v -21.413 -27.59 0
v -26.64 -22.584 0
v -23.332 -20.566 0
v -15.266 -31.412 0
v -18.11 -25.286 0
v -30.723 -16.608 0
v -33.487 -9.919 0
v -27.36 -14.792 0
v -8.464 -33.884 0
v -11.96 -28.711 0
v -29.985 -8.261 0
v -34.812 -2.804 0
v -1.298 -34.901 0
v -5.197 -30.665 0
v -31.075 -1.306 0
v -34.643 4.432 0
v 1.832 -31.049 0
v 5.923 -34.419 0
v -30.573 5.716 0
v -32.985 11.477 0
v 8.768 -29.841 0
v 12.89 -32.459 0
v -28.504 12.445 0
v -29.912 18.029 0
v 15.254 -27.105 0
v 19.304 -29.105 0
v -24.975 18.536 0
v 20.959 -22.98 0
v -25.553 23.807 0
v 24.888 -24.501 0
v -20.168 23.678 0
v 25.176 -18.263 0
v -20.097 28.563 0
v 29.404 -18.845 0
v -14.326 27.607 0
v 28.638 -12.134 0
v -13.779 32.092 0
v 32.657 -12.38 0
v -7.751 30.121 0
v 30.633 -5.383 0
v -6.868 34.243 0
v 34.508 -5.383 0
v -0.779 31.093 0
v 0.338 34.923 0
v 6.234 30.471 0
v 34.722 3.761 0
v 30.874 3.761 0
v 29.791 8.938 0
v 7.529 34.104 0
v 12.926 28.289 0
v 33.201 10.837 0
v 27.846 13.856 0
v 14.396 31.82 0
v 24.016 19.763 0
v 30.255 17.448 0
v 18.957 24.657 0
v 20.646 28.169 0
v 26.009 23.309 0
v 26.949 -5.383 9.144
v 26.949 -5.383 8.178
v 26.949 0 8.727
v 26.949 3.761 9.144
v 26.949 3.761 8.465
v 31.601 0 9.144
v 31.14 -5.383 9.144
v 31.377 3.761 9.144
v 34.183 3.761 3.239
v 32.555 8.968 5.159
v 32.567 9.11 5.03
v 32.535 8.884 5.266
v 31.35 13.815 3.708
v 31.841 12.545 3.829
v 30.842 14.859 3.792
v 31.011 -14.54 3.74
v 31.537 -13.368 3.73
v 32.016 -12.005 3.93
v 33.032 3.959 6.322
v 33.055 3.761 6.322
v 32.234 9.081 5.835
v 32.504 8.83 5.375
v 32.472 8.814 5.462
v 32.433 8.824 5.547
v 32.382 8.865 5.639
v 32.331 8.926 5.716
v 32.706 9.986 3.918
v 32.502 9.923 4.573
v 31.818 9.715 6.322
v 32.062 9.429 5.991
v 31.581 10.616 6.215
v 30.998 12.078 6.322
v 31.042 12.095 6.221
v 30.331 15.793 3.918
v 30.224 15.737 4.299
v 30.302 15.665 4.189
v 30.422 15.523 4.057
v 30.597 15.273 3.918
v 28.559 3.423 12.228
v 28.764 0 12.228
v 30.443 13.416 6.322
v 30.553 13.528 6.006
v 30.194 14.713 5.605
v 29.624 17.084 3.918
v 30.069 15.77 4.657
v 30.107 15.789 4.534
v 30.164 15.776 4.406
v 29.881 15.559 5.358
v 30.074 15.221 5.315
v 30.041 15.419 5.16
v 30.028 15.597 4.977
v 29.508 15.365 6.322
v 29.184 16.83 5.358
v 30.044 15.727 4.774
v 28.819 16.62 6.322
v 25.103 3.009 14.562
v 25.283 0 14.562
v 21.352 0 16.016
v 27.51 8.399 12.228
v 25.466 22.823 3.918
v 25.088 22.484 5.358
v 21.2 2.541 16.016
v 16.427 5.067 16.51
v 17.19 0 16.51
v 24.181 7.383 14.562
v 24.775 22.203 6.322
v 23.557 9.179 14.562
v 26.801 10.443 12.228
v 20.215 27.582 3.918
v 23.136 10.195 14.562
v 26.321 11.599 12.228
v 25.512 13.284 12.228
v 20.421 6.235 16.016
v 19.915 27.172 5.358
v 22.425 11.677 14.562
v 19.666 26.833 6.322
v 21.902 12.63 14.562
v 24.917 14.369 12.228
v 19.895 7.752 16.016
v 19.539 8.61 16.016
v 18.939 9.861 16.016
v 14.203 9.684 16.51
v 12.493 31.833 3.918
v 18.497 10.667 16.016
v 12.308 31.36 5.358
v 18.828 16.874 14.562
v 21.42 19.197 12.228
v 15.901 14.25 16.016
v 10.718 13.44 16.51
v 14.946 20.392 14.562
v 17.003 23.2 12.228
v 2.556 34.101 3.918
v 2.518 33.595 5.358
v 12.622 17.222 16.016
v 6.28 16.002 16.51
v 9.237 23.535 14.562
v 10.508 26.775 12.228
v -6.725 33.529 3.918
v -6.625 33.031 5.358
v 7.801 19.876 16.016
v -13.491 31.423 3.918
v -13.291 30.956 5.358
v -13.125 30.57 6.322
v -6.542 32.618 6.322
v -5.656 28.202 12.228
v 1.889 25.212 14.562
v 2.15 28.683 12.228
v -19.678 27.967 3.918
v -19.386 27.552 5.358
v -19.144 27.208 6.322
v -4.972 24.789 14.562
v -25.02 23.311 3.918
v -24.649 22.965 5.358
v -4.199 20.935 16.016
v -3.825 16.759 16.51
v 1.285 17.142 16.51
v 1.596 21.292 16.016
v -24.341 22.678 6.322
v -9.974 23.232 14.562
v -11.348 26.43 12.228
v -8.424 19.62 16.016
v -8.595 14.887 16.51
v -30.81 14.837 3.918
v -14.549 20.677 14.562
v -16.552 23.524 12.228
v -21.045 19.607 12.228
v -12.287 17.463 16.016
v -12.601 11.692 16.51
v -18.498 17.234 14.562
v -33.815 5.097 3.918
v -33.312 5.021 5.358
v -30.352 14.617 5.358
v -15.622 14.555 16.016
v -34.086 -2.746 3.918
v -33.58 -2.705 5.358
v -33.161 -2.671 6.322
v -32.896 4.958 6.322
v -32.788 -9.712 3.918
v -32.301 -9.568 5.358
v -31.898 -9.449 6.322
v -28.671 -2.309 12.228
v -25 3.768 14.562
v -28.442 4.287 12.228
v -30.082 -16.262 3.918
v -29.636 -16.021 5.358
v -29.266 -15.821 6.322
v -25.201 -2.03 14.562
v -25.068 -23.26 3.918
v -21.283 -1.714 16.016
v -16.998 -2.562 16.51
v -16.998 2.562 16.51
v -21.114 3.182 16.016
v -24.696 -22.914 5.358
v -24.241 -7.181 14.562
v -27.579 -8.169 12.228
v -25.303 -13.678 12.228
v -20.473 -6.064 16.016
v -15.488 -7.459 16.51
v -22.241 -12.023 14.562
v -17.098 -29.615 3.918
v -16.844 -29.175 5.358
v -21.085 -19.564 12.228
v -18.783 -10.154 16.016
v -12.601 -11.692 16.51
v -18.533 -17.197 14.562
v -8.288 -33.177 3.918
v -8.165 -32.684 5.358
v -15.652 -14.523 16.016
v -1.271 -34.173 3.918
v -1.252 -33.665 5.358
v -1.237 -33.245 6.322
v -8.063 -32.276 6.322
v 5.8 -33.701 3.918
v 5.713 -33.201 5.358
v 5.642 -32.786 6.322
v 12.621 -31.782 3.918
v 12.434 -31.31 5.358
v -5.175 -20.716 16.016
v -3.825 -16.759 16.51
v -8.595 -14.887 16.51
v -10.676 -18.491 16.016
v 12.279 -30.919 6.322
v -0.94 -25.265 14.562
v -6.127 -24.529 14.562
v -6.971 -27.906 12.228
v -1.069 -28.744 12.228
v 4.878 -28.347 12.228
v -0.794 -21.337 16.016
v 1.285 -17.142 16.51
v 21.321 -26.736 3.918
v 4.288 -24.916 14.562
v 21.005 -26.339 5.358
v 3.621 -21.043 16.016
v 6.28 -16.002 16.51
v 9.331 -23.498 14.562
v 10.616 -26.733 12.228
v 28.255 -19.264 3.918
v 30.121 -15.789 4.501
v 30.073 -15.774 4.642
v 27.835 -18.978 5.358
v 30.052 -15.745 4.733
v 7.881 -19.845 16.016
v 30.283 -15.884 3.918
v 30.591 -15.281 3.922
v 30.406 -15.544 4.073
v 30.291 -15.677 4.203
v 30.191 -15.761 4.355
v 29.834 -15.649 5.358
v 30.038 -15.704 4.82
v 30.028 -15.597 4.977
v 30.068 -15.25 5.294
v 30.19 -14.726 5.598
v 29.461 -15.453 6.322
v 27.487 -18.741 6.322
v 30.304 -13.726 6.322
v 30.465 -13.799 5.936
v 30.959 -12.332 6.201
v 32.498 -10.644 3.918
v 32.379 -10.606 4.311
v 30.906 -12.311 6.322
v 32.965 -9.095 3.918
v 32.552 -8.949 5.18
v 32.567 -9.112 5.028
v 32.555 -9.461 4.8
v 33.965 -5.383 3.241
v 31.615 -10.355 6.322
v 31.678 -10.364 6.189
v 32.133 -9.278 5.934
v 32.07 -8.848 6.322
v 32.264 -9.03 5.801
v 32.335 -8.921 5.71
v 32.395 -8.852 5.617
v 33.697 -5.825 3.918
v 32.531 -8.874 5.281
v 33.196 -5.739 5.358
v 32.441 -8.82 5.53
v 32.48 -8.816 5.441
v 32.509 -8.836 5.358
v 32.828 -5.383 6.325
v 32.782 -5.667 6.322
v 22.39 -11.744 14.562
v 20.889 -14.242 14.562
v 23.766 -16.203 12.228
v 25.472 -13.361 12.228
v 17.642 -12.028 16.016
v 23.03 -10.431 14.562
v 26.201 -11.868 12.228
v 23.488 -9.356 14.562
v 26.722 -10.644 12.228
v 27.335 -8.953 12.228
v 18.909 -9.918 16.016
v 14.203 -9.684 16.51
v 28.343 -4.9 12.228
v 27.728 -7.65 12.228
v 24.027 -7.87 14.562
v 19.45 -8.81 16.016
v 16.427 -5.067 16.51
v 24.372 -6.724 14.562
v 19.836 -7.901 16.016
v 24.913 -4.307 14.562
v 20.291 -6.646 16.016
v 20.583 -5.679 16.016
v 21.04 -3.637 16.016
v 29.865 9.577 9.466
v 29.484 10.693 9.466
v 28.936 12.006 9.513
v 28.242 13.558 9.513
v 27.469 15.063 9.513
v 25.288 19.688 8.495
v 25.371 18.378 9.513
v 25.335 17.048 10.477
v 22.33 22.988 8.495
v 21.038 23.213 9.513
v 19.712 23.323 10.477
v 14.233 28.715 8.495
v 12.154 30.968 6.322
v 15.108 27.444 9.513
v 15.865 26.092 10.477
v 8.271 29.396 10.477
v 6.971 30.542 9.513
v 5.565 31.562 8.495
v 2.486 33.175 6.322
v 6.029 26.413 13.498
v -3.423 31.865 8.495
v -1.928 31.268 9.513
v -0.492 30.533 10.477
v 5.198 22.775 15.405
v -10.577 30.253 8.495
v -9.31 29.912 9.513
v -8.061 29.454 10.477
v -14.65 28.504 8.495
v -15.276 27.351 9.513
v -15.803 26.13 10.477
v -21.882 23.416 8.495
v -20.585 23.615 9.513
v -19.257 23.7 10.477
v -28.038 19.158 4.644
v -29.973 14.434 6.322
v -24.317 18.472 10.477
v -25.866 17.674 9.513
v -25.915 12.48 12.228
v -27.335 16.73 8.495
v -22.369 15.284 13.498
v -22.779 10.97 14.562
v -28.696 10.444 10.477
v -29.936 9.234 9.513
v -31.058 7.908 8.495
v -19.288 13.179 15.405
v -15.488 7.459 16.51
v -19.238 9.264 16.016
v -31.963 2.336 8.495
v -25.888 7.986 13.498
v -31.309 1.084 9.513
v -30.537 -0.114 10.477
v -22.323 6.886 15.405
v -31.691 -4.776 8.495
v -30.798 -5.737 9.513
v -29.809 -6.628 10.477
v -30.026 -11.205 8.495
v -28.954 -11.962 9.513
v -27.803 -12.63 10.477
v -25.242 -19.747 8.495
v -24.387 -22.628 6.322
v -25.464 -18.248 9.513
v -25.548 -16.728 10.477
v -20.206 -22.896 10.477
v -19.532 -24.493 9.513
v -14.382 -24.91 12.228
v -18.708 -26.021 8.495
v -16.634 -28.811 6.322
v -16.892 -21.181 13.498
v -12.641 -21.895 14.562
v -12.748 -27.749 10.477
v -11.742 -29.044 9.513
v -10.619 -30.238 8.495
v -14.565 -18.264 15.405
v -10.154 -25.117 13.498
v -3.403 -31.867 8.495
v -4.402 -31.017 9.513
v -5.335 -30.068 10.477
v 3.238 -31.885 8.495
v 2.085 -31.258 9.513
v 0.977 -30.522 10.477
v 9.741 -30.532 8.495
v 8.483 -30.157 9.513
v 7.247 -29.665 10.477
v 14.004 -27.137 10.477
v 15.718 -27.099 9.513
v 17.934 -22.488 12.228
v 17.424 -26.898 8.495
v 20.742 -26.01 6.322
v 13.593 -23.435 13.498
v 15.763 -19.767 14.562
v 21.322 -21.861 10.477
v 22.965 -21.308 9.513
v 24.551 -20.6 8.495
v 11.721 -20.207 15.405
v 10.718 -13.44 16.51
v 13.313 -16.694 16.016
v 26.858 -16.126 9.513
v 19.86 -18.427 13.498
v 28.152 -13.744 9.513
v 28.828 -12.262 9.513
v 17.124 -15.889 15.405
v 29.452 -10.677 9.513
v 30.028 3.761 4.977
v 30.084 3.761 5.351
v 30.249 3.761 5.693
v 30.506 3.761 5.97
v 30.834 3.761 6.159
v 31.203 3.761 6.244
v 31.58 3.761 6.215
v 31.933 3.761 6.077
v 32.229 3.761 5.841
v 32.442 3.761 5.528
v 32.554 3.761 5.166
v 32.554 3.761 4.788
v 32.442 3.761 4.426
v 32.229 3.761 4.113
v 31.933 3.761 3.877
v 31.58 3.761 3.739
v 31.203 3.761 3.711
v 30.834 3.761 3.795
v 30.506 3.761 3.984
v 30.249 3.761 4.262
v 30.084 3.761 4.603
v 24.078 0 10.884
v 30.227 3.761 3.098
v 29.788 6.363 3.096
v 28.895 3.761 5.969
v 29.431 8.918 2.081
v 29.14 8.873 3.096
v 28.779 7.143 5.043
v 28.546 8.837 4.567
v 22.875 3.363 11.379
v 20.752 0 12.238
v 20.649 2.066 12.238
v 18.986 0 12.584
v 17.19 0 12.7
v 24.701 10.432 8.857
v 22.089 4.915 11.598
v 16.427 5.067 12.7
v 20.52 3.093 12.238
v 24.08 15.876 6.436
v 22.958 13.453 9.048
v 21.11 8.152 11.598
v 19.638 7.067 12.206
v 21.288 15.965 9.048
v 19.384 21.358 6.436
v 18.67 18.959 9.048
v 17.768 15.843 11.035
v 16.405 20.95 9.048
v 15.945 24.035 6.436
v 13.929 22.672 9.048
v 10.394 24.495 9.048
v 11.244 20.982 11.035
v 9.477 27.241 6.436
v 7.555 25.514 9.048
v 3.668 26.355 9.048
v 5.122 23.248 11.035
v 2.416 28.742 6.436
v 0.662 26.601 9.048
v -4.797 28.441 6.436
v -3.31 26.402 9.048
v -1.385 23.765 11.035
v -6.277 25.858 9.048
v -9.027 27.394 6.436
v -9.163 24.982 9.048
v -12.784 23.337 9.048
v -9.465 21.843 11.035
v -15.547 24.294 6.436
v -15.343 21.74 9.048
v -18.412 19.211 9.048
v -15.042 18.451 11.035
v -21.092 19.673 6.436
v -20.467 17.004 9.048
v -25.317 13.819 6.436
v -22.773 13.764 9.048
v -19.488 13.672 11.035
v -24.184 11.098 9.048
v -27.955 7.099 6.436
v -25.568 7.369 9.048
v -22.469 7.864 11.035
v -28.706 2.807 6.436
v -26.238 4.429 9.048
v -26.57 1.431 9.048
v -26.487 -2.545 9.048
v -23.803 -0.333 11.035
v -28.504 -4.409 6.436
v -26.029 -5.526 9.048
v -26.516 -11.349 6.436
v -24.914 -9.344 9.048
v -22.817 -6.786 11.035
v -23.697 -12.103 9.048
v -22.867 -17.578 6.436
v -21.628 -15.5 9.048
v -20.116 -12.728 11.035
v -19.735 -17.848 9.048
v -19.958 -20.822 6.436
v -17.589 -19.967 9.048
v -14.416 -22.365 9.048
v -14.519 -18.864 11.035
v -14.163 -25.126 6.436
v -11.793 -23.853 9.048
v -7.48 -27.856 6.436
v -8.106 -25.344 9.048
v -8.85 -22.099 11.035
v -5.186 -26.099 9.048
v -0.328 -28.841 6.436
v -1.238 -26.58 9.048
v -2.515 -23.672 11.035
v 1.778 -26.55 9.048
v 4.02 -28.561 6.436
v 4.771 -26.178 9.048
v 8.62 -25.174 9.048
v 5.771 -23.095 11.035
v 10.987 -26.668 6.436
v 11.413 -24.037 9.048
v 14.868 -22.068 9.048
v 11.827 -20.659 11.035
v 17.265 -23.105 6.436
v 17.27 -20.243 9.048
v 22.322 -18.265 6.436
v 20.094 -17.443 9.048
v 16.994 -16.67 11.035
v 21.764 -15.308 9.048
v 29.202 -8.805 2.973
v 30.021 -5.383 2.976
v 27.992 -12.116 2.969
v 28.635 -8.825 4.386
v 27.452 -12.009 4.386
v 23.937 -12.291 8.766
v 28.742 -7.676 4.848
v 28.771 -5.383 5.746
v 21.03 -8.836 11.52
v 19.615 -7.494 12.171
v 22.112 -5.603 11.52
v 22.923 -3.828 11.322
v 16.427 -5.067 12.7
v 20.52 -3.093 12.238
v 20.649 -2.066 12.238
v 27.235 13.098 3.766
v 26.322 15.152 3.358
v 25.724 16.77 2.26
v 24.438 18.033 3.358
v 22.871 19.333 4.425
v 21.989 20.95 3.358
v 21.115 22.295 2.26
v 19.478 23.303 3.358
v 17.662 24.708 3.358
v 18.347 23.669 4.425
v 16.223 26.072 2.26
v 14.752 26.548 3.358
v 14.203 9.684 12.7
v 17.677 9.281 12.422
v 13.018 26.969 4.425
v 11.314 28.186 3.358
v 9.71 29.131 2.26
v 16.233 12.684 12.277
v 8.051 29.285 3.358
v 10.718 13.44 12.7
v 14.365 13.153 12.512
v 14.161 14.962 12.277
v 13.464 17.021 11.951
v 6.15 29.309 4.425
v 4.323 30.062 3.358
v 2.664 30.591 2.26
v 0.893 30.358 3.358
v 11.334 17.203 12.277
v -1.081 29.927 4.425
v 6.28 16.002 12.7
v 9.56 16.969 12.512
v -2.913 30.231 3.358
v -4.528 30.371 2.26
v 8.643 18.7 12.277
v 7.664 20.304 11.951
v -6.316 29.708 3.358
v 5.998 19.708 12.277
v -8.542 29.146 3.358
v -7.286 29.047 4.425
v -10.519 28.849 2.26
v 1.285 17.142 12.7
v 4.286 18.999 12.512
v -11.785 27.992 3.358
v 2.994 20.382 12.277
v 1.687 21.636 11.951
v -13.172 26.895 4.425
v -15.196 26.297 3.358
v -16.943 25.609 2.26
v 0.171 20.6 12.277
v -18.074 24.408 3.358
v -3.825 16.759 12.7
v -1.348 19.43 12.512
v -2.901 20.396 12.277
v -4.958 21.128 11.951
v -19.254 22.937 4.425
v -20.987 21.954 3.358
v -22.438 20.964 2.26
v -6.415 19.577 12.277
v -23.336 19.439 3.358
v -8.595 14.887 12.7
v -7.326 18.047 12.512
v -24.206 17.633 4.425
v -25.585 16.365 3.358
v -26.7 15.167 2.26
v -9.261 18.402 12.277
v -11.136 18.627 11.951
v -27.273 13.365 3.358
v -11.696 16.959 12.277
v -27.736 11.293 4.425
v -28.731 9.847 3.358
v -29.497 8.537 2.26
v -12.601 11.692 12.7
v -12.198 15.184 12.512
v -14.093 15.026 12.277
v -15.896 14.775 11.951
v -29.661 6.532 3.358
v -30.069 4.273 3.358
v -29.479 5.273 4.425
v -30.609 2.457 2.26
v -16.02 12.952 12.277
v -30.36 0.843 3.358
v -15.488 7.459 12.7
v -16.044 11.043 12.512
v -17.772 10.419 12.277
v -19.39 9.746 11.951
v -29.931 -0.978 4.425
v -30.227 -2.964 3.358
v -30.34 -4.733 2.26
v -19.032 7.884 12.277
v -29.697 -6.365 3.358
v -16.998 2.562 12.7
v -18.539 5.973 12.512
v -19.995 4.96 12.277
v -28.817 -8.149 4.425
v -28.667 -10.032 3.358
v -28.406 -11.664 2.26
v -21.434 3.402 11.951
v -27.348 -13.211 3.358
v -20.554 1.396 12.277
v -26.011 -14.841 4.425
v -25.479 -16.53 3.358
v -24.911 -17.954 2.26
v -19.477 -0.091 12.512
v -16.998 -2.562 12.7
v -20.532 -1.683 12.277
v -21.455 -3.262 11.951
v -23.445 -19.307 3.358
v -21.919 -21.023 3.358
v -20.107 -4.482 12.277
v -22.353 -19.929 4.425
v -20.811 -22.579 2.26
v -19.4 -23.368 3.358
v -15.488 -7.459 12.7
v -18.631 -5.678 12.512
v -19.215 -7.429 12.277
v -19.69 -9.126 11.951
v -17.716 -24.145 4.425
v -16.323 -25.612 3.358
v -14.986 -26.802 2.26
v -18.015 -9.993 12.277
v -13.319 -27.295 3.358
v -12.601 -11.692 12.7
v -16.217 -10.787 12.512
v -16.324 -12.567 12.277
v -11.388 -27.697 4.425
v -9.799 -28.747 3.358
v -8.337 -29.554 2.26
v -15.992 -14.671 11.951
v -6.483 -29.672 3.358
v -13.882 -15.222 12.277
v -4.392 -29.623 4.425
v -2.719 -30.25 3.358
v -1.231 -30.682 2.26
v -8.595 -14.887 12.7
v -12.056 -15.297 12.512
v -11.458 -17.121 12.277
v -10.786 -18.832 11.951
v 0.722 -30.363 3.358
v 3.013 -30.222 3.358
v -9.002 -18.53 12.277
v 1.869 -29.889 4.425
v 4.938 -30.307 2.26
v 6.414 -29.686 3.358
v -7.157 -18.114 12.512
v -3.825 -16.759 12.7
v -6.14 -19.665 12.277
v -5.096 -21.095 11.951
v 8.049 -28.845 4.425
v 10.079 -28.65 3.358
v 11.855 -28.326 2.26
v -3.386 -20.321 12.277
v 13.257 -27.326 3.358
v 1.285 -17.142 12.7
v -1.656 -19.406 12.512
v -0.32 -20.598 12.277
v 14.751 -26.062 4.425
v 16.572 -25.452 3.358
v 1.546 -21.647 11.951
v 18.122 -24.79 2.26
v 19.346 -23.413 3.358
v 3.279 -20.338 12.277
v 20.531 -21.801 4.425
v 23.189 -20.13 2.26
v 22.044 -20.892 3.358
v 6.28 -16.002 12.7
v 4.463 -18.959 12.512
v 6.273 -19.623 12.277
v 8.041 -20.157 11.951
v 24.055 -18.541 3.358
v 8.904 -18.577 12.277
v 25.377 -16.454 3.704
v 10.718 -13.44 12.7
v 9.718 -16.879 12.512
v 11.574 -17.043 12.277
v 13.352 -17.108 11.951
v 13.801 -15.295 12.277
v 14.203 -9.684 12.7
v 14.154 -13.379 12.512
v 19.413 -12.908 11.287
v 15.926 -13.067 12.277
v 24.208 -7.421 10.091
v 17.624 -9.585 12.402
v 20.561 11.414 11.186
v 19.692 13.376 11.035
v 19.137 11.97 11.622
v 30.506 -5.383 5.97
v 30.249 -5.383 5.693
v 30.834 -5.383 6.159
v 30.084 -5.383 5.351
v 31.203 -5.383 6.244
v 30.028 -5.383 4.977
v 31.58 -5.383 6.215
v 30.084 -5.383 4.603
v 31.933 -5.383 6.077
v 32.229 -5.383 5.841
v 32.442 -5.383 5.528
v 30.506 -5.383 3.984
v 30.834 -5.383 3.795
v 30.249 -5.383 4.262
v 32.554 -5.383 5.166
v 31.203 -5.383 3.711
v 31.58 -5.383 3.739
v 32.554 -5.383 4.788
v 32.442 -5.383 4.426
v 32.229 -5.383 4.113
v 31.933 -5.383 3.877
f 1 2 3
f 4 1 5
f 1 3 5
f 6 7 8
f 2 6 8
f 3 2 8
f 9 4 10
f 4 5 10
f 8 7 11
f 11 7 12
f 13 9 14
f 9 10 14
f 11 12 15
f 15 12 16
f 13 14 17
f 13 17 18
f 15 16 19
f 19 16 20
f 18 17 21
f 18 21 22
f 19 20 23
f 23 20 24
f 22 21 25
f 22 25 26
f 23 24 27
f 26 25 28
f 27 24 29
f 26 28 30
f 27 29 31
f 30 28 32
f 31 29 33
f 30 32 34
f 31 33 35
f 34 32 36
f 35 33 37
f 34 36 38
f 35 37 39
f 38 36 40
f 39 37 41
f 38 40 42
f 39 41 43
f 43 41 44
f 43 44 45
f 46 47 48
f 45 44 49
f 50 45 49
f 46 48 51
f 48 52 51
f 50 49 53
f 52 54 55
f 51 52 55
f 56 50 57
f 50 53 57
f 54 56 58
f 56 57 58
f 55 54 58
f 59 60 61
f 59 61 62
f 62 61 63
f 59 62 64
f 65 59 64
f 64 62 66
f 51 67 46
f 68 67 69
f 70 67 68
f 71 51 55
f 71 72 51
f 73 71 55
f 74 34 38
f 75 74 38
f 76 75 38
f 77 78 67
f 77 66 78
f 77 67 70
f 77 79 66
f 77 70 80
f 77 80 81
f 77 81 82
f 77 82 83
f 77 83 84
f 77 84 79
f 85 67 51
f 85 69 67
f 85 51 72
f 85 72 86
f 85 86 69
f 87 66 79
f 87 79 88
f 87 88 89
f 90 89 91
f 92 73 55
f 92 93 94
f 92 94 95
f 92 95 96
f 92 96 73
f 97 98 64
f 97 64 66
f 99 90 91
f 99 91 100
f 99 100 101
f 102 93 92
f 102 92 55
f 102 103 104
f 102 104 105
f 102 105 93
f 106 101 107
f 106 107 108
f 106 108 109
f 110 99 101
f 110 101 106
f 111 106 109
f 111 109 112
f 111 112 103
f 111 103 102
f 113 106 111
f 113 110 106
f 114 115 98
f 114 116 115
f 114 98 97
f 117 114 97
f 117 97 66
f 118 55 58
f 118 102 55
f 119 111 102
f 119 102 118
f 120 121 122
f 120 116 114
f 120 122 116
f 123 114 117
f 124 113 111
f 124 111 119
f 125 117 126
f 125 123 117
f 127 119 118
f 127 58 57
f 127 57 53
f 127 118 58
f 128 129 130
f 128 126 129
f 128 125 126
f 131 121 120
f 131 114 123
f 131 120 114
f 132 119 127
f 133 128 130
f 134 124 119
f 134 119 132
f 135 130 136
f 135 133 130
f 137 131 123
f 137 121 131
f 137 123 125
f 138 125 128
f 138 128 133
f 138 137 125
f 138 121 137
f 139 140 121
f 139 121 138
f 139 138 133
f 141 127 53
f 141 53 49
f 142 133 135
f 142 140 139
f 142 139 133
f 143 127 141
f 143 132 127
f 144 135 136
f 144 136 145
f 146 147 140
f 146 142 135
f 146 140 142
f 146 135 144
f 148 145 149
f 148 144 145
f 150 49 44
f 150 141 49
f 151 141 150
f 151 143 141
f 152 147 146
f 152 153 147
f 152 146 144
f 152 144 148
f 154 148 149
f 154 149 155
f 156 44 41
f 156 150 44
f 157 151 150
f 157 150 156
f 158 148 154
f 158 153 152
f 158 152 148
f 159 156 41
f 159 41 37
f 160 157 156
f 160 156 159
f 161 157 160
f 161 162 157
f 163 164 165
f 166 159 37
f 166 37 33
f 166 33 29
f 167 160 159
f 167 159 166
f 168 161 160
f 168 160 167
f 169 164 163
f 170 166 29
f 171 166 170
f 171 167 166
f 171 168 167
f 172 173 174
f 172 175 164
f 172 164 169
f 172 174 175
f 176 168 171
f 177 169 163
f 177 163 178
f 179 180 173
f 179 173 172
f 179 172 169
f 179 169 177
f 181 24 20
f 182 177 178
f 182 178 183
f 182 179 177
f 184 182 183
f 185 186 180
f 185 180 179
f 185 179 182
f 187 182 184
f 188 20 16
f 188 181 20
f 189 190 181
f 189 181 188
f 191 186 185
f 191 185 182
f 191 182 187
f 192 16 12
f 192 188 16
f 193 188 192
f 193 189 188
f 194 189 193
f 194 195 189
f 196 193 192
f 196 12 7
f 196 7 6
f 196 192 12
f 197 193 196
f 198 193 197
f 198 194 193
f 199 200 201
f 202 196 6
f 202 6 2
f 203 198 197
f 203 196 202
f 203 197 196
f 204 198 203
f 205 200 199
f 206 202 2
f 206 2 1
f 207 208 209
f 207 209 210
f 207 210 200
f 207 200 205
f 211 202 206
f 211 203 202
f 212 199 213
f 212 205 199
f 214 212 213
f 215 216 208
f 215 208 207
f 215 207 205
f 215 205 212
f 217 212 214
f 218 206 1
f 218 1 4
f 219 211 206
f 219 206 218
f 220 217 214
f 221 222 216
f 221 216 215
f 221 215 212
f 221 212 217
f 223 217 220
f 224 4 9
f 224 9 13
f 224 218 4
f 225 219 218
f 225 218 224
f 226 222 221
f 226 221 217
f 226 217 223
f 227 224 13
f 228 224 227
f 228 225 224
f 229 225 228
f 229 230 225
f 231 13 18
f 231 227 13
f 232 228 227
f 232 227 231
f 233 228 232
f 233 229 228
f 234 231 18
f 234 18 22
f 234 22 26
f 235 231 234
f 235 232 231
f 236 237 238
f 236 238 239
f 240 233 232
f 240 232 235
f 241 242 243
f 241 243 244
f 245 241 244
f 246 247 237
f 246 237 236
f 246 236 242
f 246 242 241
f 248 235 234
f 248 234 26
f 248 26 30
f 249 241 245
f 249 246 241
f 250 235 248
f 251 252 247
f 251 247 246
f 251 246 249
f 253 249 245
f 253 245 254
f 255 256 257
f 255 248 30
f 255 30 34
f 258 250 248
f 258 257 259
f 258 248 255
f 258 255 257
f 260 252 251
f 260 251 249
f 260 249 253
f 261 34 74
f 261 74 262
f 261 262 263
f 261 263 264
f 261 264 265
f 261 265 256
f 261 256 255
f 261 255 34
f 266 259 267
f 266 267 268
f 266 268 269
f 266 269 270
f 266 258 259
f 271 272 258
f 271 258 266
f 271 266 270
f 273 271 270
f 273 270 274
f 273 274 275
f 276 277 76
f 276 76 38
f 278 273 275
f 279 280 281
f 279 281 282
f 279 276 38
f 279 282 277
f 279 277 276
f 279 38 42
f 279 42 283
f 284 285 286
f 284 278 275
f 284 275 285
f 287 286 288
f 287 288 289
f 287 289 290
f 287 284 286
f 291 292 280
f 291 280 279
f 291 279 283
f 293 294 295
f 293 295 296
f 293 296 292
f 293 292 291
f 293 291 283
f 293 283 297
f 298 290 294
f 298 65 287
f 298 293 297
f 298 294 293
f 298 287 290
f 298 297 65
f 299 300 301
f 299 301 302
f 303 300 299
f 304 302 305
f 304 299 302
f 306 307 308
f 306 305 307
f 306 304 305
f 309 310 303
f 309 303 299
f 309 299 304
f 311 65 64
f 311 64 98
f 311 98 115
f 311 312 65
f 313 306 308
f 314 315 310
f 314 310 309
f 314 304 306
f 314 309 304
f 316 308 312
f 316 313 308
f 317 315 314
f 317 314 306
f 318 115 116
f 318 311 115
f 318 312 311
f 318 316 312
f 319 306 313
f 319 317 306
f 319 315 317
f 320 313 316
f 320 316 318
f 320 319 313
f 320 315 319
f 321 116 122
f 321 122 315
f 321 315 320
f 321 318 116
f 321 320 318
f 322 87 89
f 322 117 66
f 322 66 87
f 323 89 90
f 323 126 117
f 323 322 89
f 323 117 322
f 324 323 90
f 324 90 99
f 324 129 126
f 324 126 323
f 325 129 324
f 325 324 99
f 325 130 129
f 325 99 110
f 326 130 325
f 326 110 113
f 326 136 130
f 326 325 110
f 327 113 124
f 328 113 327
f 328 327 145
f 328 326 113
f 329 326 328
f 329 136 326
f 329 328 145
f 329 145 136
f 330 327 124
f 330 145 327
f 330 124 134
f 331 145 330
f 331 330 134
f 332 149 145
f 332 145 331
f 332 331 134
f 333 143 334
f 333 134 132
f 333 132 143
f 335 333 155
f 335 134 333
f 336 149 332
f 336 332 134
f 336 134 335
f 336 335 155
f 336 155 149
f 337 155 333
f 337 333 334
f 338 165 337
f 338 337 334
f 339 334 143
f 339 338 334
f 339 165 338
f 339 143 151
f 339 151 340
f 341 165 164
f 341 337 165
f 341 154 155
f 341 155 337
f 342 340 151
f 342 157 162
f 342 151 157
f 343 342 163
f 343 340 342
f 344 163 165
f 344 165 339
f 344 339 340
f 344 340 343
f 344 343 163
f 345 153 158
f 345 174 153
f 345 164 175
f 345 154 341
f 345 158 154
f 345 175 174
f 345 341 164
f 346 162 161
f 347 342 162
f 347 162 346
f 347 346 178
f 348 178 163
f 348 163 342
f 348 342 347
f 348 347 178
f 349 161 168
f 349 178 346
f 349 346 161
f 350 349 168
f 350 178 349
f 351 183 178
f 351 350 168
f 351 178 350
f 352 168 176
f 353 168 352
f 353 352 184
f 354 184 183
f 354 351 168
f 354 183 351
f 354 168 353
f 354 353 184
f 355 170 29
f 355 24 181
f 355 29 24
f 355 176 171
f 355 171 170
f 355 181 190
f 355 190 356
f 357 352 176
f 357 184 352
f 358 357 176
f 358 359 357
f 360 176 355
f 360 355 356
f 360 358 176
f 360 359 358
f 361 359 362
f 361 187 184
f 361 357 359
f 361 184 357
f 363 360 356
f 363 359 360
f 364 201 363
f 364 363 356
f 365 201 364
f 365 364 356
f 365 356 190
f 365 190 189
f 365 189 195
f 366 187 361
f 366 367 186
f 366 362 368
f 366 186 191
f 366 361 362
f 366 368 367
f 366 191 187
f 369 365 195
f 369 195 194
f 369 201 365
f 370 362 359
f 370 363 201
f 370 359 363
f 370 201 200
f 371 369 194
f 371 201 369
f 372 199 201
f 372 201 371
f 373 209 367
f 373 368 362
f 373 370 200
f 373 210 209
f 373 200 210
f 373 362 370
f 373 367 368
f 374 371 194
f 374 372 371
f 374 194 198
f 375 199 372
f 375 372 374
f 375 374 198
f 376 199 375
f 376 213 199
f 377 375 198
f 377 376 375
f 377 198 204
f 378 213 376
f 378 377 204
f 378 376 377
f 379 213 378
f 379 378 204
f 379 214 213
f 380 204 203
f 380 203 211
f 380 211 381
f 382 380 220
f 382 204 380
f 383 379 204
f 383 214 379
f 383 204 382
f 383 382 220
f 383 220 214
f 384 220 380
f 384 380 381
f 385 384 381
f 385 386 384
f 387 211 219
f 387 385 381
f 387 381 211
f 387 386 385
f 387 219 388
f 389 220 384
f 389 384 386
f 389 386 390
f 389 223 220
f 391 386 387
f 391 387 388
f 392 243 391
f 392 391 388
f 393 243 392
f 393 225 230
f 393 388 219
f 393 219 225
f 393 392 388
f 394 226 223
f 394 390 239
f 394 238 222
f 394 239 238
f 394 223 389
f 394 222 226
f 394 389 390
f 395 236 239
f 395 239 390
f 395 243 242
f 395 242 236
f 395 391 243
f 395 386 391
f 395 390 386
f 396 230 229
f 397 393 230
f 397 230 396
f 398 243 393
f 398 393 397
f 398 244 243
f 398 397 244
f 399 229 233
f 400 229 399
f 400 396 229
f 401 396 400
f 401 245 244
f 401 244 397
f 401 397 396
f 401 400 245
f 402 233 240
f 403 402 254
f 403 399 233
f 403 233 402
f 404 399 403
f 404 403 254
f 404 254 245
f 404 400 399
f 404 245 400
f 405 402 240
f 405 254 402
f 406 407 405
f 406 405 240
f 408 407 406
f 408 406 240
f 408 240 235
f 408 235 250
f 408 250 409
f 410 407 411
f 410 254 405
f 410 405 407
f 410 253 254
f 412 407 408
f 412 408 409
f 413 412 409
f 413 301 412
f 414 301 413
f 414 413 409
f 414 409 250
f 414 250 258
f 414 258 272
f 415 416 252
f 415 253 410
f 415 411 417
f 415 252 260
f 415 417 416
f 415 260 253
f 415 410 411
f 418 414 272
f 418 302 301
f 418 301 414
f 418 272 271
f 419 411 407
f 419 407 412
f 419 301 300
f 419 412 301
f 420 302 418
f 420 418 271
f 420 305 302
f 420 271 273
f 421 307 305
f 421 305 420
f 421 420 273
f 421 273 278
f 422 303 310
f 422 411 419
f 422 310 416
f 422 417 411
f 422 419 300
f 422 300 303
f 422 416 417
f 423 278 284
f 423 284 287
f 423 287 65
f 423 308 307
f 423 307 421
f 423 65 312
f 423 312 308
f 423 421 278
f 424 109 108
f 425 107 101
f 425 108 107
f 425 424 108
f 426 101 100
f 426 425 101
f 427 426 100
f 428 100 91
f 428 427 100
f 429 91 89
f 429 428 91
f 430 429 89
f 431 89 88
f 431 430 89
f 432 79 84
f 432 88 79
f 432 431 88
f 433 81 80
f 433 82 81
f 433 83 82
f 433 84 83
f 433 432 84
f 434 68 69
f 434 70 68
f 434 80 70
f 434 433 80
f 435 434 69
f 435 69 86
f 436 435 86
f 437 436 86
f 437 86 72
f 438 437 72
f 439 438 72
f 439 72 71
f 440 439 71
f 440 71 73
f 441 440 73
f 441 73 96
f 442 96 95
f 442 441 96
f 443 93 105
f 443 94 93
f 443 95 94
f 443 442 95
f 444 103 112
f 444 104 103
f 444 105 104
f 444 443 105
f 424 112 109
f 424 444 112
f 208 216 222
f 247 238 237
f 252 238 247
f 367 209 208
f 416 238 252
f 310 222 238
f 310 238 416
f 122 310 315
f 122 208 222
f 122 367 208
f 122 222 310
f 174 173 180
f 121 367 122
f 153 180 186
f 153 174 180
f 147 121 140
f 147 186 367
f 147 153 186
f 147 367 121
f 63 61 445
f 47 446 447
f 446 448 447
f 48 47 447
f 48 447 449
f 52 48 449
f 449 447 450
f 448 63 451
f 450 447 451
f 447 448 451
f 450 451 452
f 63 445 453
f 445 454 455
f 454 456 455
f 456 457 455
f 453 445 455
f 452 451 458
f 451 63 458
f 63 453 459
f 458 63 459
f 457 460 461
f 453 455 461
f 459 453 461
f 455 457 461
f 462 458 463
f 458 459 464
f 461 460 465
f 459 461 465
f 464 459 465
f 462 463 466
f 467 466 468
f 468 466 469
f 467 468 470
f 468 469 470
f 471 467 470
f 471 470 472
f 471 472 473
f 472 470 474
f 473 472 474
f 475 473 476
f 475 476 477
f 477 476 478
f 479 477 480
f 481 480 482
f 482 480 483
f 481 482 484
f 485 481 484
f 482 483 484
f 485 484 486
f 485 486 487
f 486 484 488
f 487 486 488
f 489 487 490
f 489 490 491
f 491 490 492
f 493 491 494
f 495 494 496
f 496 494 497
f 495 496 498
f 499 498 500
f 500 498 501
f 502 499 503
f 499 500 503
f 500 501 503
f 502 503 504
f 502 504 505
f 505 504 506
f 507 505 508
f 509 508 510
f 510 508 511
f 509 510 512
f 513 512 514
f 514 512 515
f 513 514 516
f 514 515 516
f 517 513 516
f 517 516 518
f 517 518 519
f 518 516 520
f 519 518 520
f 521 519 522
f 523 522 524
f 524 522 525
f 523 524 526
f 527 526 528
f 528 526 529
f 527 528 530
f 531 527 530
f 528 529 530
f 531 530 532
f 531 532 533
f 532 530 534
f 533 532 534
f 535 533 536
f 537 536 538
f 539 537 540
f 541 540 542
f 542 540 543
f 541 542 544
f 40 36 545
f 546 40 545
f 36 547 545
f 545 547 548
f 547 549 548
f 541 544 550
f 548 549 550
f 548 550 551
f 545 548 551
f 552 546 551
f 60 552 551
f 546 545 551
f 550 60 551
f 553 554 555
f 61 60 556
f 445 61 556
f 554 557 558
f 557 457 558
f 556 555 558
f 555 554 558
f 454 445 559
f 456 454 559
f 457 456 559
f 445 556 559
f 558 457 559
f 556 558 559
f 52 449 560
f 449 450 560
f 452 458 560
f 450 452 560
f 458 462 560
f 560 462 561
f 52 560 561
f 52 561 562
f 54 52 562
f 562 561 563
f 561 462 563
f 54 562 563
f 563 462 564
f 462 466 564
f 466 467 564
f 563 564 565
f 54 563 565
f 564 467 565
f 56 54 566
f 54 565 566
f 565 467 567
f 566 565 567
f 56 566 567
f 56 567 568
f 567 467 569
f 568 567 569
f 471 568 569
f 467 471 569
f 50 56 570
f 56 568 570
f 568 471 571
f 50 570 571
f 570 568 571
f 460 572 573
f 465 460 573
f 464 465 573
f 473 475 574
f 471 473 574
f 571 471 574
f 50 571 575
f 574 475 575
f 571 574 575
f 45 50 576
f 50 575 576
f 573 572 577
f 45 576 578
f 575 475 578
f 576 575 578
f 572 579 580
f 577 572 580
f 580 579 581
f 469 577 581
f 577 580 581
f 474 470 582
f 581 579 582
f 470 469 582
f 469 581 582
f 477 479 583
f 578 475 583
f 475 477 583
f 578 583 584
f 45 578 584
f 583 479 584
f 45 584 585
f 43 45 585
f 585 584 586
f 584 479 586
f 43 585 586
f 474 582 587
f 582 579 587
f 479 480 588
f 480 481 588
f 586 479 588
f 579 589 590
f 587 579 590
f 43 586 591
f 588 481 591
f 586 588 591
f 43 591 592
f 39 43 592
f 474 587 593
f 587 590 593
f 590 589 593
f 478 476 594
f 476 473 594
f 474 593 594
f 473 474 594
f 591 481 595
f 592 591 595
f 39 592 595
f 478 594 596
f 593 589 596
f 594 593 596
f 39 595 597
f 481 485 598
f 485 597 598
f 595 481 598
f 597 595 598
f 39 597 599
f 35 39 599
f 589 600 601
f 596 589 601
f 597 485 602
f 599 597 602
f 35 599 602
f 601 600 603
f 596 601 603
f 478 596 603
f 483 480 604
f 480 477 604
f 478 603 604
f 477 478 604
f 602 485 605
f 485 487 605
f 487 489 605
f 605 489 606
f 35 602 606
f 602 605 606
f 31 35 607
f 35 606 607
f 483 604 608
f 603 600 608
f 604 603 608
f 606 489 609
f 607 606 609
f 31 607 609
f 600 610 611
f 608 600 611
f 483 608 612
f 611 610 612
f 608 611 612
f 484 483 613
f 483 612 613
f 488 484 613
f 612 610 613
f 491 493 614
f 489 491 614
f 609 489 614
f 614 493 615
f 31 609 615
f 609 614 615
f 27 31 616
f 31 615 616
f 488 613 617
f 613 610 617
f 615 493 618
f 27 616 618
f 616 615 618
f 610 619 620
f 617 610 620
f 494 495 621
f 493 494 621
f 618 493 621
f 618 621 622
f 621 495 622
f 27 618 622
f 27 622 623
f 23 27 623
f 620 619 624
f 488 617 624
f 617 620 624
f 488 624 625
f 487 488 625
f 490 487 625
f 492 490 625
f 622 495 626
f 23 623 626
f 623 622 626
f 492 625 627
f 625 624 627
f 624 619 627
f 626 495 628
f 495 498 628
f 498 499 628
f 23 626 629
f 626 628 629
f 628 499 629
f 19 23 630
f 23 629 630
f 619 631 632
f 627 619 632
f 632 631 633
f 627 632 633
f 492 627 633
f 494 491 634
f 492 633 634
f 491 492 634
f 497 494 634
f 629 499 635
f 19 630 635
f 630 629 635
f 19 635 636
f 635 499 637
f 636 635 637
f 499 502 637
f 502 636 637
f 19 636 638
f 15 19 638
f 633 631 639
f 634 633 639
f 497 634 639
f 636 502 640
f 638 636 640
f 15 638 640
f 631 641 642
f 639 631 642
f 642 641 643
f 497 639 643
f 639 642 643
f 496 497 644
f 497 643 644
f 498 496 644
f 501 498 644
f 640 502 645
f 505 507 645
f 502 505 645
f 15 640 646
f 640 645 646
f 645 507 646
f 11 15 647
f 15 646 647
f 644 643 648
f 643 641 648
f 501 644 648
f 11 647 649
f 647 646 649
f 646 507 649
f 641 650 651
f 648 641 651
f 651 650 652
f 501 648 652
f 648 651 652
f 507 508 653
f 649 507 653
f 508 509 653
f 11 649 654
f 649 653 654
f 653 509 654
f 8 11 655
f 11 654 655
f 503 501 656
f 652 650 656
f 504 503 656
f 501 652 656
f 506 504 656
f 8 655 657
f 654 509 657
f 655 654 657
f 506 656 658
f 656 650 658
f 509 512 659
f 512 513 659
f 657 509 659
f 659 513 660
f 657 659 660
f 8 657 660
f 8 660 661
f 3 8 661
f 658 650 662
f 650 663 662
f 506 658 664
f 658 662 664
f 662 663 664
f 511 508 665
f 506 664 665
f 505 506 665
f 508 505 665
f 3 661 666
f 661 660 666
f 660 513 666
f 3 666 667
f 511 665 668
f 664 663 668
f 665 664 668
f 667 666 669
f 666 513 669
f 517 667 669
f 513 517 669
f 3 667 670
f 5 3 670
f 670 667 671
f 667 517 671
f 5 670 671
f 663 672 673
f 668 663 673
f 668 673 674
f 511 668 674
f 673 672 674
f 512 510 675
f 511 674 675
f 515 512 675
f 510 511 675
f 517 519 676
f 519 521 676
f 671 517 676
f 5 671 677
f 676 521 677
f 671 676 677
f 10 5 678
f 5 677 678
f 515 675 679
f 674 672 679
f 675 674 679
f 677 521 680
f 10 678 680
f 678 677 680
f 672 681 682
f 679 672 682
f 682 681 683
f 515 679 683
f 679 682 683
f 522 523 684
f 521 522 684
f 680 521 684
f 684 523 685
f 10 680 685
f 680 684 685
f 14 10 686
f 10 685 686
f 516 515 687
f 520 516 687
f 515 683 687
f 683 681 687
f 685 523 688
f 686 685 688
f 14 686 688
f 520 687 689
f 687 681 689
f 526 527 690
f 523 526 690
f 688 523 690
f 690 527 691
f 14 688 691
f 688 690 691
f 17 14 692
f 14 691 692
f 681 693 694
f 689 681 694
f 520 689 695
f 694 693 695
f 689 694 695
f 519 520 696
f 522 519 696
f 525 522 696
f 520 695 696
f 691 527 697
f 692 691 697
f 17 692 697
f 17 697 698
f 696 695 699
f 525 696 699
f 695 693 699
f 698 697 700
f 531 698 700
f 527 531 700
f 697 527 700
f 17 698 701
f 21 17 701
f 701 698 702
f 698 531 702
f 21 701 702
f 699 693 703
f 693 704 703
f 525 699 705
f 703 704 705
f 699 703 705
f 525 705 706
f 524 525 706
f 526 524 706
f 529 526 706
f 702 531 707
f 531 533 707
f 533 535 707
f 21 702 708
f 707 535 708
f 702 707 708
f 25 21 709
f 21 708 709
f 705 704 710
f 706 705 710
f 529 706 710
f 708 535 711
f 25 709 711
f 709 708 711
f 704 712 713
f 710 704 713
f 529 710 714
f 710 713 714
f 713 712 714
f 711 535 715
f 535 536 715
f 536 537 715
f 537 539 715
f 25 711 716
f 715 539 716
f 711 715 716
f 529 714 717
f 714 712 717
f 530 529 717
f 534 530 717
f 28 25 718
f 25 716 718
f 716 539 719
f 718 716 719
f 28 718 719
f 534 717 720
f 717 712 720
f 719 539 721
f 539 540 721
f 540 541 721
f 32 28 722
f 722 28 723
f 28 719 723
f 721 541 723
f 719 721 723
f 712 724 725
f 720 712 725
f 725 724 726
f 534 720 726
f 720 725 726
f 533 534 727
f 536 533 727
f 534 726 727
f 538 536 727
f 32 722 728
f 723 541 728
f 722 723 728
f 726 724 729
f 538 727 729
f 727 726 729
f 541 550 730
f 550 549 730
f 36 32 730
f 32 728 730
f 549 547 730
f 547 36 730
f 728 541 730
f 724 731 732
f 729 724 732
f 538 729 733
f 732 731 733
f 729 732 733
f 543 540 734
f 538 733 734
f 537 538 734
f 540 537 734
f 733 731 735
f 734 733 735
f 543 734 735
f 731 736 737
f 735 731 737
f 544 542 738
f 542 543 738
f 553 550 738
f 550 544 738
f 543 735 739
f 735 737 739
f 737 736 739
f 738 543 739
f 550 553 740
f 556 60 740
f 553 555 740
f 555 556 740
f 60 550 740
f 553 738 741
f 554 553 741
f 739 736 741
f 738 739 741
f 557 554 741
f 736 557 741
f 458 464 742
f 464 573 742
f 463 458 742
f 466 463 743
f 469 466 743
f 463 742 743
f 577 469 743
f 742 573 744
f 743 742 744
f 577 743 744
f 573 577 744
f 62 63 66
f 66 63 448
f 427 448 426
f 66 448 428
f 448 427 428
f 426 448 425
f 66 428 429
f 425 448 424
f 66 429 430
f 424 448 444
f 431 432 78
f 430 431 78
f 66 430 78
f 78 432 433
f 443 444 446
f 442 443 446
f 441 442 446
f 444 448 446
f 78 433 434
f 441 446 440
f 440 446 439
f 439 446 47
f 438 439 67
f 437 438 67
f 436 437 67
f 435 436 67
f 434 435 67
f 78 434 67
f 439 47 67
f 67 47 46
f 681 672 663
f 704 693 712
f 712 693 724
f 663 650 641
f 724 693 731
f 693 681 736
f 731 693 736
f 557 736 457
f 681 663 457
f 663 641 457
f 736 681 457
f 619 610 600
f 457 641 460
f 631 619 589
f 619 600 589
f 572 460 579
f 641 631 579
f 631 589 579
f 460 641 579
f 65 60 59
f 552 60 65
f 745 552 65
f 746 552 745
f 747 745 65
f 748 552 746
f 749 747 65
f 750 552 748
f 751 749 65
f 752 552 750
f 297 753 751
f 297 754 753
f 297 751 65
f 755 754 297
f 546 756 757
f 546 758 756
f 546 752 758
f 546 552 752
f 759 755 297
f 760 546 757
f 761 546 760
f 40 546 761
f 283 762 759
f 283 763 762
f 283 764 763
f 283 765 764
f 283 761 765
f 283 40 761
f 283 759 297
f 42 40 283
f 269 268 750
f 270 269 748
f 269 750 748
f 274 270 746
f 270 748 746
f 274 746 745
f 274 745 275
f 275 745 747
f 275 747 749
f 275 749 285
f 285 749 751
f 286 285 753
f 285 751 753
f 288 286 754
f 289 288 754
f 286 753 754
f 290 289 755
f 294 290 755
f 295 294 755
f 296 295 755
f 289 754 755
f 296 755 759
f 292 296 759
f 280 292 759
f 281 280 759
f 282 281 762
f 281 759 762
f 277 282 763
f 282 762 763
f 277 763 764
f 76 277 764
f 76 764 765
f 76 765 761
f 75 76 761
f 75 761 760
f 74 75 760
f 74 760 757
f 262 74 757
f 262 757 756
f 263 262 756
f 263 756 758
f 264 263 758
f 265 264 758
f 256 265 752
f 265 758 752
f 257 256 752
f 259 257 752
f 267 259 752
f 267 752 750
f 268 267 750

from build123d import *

# Parameters (mm, degrees)
F0_R          = 34.925
F1_DEPTH      = 16.51
F3_T          = -3.81
F4_W          = 11.3246641613
F4_H          = 9.144
F5_DEPTH      = 9.144
F6_R          = 1.27
F7_DEPTH      = 25.4
F7_DEPTH_BACK = 25.4


# Not quite as in the source:
# - a fillet or chamfer that OpenCascade refuses, or shapes differently, is made with other operations: its cross-section is extruded or revolved along the edge and cut away or added


with BuildPart() as f1:
    # F0 (on Top) → F1 (new body)
    with BuildSketch(Plane.XY):
        Circle(F0_R)
    extrude(amount=F1_DEPTH)

    # F2: fillet of radius 17.78 on 1 edges, made by hand

    # F2_s1 → F2_t2 (revolve, cut)
    with BuildSketch(Plane.XZ):
        with BuildLine():
            ThreePointArc((34.925, 0), (29.3054430024, 11.7436274728), (17.1904151444, 16.51))
            Line((17.1904151444, 16.51), (34.925, 16.51))
            Line((34.925, 16.51), (34.925, 0))
        make_face()
    revolve(axis=Axis((0, 0, 16.51), (0, 0, 1)), mode=Mode.SUBTRACT)

    # F3
    f3_openings = [f1.faces().sort_by_distance(p)[0] for p in [
        (0, 0, 0),
    ]]
    offset(amount=F3_T, openings=f3_openings)

    # F4 (on Top) → F5 (cut)
    with BuildSketch(Plane.XY):
        with Locations((32.6112154871, -0.8110651979)):
            Rectangle(F4_W, F4_H)
    extrude(amount=F5_DEPTH, mode=Mode.SUBTRACT)

    # F6 (on face) → F7 (cut, two sides)
    with BuildSketch(Plane(origin=(0, -5.3830651979, 0), x_dir=(-1, 0, 0), z_dir=(0, 1, 0))) as f7_sk:
        with Locations((-31.2978422578, 4.977144105)):
            Circle(F6_R)
    extrude(amount=-F7_DEPTH, mode=Mode.SUBTRACT)
    extrude(f7_sk.sketch, amount=F7_DEPTH_BACK, mode=Mode.SUBTRACT)


solid = f1.part
